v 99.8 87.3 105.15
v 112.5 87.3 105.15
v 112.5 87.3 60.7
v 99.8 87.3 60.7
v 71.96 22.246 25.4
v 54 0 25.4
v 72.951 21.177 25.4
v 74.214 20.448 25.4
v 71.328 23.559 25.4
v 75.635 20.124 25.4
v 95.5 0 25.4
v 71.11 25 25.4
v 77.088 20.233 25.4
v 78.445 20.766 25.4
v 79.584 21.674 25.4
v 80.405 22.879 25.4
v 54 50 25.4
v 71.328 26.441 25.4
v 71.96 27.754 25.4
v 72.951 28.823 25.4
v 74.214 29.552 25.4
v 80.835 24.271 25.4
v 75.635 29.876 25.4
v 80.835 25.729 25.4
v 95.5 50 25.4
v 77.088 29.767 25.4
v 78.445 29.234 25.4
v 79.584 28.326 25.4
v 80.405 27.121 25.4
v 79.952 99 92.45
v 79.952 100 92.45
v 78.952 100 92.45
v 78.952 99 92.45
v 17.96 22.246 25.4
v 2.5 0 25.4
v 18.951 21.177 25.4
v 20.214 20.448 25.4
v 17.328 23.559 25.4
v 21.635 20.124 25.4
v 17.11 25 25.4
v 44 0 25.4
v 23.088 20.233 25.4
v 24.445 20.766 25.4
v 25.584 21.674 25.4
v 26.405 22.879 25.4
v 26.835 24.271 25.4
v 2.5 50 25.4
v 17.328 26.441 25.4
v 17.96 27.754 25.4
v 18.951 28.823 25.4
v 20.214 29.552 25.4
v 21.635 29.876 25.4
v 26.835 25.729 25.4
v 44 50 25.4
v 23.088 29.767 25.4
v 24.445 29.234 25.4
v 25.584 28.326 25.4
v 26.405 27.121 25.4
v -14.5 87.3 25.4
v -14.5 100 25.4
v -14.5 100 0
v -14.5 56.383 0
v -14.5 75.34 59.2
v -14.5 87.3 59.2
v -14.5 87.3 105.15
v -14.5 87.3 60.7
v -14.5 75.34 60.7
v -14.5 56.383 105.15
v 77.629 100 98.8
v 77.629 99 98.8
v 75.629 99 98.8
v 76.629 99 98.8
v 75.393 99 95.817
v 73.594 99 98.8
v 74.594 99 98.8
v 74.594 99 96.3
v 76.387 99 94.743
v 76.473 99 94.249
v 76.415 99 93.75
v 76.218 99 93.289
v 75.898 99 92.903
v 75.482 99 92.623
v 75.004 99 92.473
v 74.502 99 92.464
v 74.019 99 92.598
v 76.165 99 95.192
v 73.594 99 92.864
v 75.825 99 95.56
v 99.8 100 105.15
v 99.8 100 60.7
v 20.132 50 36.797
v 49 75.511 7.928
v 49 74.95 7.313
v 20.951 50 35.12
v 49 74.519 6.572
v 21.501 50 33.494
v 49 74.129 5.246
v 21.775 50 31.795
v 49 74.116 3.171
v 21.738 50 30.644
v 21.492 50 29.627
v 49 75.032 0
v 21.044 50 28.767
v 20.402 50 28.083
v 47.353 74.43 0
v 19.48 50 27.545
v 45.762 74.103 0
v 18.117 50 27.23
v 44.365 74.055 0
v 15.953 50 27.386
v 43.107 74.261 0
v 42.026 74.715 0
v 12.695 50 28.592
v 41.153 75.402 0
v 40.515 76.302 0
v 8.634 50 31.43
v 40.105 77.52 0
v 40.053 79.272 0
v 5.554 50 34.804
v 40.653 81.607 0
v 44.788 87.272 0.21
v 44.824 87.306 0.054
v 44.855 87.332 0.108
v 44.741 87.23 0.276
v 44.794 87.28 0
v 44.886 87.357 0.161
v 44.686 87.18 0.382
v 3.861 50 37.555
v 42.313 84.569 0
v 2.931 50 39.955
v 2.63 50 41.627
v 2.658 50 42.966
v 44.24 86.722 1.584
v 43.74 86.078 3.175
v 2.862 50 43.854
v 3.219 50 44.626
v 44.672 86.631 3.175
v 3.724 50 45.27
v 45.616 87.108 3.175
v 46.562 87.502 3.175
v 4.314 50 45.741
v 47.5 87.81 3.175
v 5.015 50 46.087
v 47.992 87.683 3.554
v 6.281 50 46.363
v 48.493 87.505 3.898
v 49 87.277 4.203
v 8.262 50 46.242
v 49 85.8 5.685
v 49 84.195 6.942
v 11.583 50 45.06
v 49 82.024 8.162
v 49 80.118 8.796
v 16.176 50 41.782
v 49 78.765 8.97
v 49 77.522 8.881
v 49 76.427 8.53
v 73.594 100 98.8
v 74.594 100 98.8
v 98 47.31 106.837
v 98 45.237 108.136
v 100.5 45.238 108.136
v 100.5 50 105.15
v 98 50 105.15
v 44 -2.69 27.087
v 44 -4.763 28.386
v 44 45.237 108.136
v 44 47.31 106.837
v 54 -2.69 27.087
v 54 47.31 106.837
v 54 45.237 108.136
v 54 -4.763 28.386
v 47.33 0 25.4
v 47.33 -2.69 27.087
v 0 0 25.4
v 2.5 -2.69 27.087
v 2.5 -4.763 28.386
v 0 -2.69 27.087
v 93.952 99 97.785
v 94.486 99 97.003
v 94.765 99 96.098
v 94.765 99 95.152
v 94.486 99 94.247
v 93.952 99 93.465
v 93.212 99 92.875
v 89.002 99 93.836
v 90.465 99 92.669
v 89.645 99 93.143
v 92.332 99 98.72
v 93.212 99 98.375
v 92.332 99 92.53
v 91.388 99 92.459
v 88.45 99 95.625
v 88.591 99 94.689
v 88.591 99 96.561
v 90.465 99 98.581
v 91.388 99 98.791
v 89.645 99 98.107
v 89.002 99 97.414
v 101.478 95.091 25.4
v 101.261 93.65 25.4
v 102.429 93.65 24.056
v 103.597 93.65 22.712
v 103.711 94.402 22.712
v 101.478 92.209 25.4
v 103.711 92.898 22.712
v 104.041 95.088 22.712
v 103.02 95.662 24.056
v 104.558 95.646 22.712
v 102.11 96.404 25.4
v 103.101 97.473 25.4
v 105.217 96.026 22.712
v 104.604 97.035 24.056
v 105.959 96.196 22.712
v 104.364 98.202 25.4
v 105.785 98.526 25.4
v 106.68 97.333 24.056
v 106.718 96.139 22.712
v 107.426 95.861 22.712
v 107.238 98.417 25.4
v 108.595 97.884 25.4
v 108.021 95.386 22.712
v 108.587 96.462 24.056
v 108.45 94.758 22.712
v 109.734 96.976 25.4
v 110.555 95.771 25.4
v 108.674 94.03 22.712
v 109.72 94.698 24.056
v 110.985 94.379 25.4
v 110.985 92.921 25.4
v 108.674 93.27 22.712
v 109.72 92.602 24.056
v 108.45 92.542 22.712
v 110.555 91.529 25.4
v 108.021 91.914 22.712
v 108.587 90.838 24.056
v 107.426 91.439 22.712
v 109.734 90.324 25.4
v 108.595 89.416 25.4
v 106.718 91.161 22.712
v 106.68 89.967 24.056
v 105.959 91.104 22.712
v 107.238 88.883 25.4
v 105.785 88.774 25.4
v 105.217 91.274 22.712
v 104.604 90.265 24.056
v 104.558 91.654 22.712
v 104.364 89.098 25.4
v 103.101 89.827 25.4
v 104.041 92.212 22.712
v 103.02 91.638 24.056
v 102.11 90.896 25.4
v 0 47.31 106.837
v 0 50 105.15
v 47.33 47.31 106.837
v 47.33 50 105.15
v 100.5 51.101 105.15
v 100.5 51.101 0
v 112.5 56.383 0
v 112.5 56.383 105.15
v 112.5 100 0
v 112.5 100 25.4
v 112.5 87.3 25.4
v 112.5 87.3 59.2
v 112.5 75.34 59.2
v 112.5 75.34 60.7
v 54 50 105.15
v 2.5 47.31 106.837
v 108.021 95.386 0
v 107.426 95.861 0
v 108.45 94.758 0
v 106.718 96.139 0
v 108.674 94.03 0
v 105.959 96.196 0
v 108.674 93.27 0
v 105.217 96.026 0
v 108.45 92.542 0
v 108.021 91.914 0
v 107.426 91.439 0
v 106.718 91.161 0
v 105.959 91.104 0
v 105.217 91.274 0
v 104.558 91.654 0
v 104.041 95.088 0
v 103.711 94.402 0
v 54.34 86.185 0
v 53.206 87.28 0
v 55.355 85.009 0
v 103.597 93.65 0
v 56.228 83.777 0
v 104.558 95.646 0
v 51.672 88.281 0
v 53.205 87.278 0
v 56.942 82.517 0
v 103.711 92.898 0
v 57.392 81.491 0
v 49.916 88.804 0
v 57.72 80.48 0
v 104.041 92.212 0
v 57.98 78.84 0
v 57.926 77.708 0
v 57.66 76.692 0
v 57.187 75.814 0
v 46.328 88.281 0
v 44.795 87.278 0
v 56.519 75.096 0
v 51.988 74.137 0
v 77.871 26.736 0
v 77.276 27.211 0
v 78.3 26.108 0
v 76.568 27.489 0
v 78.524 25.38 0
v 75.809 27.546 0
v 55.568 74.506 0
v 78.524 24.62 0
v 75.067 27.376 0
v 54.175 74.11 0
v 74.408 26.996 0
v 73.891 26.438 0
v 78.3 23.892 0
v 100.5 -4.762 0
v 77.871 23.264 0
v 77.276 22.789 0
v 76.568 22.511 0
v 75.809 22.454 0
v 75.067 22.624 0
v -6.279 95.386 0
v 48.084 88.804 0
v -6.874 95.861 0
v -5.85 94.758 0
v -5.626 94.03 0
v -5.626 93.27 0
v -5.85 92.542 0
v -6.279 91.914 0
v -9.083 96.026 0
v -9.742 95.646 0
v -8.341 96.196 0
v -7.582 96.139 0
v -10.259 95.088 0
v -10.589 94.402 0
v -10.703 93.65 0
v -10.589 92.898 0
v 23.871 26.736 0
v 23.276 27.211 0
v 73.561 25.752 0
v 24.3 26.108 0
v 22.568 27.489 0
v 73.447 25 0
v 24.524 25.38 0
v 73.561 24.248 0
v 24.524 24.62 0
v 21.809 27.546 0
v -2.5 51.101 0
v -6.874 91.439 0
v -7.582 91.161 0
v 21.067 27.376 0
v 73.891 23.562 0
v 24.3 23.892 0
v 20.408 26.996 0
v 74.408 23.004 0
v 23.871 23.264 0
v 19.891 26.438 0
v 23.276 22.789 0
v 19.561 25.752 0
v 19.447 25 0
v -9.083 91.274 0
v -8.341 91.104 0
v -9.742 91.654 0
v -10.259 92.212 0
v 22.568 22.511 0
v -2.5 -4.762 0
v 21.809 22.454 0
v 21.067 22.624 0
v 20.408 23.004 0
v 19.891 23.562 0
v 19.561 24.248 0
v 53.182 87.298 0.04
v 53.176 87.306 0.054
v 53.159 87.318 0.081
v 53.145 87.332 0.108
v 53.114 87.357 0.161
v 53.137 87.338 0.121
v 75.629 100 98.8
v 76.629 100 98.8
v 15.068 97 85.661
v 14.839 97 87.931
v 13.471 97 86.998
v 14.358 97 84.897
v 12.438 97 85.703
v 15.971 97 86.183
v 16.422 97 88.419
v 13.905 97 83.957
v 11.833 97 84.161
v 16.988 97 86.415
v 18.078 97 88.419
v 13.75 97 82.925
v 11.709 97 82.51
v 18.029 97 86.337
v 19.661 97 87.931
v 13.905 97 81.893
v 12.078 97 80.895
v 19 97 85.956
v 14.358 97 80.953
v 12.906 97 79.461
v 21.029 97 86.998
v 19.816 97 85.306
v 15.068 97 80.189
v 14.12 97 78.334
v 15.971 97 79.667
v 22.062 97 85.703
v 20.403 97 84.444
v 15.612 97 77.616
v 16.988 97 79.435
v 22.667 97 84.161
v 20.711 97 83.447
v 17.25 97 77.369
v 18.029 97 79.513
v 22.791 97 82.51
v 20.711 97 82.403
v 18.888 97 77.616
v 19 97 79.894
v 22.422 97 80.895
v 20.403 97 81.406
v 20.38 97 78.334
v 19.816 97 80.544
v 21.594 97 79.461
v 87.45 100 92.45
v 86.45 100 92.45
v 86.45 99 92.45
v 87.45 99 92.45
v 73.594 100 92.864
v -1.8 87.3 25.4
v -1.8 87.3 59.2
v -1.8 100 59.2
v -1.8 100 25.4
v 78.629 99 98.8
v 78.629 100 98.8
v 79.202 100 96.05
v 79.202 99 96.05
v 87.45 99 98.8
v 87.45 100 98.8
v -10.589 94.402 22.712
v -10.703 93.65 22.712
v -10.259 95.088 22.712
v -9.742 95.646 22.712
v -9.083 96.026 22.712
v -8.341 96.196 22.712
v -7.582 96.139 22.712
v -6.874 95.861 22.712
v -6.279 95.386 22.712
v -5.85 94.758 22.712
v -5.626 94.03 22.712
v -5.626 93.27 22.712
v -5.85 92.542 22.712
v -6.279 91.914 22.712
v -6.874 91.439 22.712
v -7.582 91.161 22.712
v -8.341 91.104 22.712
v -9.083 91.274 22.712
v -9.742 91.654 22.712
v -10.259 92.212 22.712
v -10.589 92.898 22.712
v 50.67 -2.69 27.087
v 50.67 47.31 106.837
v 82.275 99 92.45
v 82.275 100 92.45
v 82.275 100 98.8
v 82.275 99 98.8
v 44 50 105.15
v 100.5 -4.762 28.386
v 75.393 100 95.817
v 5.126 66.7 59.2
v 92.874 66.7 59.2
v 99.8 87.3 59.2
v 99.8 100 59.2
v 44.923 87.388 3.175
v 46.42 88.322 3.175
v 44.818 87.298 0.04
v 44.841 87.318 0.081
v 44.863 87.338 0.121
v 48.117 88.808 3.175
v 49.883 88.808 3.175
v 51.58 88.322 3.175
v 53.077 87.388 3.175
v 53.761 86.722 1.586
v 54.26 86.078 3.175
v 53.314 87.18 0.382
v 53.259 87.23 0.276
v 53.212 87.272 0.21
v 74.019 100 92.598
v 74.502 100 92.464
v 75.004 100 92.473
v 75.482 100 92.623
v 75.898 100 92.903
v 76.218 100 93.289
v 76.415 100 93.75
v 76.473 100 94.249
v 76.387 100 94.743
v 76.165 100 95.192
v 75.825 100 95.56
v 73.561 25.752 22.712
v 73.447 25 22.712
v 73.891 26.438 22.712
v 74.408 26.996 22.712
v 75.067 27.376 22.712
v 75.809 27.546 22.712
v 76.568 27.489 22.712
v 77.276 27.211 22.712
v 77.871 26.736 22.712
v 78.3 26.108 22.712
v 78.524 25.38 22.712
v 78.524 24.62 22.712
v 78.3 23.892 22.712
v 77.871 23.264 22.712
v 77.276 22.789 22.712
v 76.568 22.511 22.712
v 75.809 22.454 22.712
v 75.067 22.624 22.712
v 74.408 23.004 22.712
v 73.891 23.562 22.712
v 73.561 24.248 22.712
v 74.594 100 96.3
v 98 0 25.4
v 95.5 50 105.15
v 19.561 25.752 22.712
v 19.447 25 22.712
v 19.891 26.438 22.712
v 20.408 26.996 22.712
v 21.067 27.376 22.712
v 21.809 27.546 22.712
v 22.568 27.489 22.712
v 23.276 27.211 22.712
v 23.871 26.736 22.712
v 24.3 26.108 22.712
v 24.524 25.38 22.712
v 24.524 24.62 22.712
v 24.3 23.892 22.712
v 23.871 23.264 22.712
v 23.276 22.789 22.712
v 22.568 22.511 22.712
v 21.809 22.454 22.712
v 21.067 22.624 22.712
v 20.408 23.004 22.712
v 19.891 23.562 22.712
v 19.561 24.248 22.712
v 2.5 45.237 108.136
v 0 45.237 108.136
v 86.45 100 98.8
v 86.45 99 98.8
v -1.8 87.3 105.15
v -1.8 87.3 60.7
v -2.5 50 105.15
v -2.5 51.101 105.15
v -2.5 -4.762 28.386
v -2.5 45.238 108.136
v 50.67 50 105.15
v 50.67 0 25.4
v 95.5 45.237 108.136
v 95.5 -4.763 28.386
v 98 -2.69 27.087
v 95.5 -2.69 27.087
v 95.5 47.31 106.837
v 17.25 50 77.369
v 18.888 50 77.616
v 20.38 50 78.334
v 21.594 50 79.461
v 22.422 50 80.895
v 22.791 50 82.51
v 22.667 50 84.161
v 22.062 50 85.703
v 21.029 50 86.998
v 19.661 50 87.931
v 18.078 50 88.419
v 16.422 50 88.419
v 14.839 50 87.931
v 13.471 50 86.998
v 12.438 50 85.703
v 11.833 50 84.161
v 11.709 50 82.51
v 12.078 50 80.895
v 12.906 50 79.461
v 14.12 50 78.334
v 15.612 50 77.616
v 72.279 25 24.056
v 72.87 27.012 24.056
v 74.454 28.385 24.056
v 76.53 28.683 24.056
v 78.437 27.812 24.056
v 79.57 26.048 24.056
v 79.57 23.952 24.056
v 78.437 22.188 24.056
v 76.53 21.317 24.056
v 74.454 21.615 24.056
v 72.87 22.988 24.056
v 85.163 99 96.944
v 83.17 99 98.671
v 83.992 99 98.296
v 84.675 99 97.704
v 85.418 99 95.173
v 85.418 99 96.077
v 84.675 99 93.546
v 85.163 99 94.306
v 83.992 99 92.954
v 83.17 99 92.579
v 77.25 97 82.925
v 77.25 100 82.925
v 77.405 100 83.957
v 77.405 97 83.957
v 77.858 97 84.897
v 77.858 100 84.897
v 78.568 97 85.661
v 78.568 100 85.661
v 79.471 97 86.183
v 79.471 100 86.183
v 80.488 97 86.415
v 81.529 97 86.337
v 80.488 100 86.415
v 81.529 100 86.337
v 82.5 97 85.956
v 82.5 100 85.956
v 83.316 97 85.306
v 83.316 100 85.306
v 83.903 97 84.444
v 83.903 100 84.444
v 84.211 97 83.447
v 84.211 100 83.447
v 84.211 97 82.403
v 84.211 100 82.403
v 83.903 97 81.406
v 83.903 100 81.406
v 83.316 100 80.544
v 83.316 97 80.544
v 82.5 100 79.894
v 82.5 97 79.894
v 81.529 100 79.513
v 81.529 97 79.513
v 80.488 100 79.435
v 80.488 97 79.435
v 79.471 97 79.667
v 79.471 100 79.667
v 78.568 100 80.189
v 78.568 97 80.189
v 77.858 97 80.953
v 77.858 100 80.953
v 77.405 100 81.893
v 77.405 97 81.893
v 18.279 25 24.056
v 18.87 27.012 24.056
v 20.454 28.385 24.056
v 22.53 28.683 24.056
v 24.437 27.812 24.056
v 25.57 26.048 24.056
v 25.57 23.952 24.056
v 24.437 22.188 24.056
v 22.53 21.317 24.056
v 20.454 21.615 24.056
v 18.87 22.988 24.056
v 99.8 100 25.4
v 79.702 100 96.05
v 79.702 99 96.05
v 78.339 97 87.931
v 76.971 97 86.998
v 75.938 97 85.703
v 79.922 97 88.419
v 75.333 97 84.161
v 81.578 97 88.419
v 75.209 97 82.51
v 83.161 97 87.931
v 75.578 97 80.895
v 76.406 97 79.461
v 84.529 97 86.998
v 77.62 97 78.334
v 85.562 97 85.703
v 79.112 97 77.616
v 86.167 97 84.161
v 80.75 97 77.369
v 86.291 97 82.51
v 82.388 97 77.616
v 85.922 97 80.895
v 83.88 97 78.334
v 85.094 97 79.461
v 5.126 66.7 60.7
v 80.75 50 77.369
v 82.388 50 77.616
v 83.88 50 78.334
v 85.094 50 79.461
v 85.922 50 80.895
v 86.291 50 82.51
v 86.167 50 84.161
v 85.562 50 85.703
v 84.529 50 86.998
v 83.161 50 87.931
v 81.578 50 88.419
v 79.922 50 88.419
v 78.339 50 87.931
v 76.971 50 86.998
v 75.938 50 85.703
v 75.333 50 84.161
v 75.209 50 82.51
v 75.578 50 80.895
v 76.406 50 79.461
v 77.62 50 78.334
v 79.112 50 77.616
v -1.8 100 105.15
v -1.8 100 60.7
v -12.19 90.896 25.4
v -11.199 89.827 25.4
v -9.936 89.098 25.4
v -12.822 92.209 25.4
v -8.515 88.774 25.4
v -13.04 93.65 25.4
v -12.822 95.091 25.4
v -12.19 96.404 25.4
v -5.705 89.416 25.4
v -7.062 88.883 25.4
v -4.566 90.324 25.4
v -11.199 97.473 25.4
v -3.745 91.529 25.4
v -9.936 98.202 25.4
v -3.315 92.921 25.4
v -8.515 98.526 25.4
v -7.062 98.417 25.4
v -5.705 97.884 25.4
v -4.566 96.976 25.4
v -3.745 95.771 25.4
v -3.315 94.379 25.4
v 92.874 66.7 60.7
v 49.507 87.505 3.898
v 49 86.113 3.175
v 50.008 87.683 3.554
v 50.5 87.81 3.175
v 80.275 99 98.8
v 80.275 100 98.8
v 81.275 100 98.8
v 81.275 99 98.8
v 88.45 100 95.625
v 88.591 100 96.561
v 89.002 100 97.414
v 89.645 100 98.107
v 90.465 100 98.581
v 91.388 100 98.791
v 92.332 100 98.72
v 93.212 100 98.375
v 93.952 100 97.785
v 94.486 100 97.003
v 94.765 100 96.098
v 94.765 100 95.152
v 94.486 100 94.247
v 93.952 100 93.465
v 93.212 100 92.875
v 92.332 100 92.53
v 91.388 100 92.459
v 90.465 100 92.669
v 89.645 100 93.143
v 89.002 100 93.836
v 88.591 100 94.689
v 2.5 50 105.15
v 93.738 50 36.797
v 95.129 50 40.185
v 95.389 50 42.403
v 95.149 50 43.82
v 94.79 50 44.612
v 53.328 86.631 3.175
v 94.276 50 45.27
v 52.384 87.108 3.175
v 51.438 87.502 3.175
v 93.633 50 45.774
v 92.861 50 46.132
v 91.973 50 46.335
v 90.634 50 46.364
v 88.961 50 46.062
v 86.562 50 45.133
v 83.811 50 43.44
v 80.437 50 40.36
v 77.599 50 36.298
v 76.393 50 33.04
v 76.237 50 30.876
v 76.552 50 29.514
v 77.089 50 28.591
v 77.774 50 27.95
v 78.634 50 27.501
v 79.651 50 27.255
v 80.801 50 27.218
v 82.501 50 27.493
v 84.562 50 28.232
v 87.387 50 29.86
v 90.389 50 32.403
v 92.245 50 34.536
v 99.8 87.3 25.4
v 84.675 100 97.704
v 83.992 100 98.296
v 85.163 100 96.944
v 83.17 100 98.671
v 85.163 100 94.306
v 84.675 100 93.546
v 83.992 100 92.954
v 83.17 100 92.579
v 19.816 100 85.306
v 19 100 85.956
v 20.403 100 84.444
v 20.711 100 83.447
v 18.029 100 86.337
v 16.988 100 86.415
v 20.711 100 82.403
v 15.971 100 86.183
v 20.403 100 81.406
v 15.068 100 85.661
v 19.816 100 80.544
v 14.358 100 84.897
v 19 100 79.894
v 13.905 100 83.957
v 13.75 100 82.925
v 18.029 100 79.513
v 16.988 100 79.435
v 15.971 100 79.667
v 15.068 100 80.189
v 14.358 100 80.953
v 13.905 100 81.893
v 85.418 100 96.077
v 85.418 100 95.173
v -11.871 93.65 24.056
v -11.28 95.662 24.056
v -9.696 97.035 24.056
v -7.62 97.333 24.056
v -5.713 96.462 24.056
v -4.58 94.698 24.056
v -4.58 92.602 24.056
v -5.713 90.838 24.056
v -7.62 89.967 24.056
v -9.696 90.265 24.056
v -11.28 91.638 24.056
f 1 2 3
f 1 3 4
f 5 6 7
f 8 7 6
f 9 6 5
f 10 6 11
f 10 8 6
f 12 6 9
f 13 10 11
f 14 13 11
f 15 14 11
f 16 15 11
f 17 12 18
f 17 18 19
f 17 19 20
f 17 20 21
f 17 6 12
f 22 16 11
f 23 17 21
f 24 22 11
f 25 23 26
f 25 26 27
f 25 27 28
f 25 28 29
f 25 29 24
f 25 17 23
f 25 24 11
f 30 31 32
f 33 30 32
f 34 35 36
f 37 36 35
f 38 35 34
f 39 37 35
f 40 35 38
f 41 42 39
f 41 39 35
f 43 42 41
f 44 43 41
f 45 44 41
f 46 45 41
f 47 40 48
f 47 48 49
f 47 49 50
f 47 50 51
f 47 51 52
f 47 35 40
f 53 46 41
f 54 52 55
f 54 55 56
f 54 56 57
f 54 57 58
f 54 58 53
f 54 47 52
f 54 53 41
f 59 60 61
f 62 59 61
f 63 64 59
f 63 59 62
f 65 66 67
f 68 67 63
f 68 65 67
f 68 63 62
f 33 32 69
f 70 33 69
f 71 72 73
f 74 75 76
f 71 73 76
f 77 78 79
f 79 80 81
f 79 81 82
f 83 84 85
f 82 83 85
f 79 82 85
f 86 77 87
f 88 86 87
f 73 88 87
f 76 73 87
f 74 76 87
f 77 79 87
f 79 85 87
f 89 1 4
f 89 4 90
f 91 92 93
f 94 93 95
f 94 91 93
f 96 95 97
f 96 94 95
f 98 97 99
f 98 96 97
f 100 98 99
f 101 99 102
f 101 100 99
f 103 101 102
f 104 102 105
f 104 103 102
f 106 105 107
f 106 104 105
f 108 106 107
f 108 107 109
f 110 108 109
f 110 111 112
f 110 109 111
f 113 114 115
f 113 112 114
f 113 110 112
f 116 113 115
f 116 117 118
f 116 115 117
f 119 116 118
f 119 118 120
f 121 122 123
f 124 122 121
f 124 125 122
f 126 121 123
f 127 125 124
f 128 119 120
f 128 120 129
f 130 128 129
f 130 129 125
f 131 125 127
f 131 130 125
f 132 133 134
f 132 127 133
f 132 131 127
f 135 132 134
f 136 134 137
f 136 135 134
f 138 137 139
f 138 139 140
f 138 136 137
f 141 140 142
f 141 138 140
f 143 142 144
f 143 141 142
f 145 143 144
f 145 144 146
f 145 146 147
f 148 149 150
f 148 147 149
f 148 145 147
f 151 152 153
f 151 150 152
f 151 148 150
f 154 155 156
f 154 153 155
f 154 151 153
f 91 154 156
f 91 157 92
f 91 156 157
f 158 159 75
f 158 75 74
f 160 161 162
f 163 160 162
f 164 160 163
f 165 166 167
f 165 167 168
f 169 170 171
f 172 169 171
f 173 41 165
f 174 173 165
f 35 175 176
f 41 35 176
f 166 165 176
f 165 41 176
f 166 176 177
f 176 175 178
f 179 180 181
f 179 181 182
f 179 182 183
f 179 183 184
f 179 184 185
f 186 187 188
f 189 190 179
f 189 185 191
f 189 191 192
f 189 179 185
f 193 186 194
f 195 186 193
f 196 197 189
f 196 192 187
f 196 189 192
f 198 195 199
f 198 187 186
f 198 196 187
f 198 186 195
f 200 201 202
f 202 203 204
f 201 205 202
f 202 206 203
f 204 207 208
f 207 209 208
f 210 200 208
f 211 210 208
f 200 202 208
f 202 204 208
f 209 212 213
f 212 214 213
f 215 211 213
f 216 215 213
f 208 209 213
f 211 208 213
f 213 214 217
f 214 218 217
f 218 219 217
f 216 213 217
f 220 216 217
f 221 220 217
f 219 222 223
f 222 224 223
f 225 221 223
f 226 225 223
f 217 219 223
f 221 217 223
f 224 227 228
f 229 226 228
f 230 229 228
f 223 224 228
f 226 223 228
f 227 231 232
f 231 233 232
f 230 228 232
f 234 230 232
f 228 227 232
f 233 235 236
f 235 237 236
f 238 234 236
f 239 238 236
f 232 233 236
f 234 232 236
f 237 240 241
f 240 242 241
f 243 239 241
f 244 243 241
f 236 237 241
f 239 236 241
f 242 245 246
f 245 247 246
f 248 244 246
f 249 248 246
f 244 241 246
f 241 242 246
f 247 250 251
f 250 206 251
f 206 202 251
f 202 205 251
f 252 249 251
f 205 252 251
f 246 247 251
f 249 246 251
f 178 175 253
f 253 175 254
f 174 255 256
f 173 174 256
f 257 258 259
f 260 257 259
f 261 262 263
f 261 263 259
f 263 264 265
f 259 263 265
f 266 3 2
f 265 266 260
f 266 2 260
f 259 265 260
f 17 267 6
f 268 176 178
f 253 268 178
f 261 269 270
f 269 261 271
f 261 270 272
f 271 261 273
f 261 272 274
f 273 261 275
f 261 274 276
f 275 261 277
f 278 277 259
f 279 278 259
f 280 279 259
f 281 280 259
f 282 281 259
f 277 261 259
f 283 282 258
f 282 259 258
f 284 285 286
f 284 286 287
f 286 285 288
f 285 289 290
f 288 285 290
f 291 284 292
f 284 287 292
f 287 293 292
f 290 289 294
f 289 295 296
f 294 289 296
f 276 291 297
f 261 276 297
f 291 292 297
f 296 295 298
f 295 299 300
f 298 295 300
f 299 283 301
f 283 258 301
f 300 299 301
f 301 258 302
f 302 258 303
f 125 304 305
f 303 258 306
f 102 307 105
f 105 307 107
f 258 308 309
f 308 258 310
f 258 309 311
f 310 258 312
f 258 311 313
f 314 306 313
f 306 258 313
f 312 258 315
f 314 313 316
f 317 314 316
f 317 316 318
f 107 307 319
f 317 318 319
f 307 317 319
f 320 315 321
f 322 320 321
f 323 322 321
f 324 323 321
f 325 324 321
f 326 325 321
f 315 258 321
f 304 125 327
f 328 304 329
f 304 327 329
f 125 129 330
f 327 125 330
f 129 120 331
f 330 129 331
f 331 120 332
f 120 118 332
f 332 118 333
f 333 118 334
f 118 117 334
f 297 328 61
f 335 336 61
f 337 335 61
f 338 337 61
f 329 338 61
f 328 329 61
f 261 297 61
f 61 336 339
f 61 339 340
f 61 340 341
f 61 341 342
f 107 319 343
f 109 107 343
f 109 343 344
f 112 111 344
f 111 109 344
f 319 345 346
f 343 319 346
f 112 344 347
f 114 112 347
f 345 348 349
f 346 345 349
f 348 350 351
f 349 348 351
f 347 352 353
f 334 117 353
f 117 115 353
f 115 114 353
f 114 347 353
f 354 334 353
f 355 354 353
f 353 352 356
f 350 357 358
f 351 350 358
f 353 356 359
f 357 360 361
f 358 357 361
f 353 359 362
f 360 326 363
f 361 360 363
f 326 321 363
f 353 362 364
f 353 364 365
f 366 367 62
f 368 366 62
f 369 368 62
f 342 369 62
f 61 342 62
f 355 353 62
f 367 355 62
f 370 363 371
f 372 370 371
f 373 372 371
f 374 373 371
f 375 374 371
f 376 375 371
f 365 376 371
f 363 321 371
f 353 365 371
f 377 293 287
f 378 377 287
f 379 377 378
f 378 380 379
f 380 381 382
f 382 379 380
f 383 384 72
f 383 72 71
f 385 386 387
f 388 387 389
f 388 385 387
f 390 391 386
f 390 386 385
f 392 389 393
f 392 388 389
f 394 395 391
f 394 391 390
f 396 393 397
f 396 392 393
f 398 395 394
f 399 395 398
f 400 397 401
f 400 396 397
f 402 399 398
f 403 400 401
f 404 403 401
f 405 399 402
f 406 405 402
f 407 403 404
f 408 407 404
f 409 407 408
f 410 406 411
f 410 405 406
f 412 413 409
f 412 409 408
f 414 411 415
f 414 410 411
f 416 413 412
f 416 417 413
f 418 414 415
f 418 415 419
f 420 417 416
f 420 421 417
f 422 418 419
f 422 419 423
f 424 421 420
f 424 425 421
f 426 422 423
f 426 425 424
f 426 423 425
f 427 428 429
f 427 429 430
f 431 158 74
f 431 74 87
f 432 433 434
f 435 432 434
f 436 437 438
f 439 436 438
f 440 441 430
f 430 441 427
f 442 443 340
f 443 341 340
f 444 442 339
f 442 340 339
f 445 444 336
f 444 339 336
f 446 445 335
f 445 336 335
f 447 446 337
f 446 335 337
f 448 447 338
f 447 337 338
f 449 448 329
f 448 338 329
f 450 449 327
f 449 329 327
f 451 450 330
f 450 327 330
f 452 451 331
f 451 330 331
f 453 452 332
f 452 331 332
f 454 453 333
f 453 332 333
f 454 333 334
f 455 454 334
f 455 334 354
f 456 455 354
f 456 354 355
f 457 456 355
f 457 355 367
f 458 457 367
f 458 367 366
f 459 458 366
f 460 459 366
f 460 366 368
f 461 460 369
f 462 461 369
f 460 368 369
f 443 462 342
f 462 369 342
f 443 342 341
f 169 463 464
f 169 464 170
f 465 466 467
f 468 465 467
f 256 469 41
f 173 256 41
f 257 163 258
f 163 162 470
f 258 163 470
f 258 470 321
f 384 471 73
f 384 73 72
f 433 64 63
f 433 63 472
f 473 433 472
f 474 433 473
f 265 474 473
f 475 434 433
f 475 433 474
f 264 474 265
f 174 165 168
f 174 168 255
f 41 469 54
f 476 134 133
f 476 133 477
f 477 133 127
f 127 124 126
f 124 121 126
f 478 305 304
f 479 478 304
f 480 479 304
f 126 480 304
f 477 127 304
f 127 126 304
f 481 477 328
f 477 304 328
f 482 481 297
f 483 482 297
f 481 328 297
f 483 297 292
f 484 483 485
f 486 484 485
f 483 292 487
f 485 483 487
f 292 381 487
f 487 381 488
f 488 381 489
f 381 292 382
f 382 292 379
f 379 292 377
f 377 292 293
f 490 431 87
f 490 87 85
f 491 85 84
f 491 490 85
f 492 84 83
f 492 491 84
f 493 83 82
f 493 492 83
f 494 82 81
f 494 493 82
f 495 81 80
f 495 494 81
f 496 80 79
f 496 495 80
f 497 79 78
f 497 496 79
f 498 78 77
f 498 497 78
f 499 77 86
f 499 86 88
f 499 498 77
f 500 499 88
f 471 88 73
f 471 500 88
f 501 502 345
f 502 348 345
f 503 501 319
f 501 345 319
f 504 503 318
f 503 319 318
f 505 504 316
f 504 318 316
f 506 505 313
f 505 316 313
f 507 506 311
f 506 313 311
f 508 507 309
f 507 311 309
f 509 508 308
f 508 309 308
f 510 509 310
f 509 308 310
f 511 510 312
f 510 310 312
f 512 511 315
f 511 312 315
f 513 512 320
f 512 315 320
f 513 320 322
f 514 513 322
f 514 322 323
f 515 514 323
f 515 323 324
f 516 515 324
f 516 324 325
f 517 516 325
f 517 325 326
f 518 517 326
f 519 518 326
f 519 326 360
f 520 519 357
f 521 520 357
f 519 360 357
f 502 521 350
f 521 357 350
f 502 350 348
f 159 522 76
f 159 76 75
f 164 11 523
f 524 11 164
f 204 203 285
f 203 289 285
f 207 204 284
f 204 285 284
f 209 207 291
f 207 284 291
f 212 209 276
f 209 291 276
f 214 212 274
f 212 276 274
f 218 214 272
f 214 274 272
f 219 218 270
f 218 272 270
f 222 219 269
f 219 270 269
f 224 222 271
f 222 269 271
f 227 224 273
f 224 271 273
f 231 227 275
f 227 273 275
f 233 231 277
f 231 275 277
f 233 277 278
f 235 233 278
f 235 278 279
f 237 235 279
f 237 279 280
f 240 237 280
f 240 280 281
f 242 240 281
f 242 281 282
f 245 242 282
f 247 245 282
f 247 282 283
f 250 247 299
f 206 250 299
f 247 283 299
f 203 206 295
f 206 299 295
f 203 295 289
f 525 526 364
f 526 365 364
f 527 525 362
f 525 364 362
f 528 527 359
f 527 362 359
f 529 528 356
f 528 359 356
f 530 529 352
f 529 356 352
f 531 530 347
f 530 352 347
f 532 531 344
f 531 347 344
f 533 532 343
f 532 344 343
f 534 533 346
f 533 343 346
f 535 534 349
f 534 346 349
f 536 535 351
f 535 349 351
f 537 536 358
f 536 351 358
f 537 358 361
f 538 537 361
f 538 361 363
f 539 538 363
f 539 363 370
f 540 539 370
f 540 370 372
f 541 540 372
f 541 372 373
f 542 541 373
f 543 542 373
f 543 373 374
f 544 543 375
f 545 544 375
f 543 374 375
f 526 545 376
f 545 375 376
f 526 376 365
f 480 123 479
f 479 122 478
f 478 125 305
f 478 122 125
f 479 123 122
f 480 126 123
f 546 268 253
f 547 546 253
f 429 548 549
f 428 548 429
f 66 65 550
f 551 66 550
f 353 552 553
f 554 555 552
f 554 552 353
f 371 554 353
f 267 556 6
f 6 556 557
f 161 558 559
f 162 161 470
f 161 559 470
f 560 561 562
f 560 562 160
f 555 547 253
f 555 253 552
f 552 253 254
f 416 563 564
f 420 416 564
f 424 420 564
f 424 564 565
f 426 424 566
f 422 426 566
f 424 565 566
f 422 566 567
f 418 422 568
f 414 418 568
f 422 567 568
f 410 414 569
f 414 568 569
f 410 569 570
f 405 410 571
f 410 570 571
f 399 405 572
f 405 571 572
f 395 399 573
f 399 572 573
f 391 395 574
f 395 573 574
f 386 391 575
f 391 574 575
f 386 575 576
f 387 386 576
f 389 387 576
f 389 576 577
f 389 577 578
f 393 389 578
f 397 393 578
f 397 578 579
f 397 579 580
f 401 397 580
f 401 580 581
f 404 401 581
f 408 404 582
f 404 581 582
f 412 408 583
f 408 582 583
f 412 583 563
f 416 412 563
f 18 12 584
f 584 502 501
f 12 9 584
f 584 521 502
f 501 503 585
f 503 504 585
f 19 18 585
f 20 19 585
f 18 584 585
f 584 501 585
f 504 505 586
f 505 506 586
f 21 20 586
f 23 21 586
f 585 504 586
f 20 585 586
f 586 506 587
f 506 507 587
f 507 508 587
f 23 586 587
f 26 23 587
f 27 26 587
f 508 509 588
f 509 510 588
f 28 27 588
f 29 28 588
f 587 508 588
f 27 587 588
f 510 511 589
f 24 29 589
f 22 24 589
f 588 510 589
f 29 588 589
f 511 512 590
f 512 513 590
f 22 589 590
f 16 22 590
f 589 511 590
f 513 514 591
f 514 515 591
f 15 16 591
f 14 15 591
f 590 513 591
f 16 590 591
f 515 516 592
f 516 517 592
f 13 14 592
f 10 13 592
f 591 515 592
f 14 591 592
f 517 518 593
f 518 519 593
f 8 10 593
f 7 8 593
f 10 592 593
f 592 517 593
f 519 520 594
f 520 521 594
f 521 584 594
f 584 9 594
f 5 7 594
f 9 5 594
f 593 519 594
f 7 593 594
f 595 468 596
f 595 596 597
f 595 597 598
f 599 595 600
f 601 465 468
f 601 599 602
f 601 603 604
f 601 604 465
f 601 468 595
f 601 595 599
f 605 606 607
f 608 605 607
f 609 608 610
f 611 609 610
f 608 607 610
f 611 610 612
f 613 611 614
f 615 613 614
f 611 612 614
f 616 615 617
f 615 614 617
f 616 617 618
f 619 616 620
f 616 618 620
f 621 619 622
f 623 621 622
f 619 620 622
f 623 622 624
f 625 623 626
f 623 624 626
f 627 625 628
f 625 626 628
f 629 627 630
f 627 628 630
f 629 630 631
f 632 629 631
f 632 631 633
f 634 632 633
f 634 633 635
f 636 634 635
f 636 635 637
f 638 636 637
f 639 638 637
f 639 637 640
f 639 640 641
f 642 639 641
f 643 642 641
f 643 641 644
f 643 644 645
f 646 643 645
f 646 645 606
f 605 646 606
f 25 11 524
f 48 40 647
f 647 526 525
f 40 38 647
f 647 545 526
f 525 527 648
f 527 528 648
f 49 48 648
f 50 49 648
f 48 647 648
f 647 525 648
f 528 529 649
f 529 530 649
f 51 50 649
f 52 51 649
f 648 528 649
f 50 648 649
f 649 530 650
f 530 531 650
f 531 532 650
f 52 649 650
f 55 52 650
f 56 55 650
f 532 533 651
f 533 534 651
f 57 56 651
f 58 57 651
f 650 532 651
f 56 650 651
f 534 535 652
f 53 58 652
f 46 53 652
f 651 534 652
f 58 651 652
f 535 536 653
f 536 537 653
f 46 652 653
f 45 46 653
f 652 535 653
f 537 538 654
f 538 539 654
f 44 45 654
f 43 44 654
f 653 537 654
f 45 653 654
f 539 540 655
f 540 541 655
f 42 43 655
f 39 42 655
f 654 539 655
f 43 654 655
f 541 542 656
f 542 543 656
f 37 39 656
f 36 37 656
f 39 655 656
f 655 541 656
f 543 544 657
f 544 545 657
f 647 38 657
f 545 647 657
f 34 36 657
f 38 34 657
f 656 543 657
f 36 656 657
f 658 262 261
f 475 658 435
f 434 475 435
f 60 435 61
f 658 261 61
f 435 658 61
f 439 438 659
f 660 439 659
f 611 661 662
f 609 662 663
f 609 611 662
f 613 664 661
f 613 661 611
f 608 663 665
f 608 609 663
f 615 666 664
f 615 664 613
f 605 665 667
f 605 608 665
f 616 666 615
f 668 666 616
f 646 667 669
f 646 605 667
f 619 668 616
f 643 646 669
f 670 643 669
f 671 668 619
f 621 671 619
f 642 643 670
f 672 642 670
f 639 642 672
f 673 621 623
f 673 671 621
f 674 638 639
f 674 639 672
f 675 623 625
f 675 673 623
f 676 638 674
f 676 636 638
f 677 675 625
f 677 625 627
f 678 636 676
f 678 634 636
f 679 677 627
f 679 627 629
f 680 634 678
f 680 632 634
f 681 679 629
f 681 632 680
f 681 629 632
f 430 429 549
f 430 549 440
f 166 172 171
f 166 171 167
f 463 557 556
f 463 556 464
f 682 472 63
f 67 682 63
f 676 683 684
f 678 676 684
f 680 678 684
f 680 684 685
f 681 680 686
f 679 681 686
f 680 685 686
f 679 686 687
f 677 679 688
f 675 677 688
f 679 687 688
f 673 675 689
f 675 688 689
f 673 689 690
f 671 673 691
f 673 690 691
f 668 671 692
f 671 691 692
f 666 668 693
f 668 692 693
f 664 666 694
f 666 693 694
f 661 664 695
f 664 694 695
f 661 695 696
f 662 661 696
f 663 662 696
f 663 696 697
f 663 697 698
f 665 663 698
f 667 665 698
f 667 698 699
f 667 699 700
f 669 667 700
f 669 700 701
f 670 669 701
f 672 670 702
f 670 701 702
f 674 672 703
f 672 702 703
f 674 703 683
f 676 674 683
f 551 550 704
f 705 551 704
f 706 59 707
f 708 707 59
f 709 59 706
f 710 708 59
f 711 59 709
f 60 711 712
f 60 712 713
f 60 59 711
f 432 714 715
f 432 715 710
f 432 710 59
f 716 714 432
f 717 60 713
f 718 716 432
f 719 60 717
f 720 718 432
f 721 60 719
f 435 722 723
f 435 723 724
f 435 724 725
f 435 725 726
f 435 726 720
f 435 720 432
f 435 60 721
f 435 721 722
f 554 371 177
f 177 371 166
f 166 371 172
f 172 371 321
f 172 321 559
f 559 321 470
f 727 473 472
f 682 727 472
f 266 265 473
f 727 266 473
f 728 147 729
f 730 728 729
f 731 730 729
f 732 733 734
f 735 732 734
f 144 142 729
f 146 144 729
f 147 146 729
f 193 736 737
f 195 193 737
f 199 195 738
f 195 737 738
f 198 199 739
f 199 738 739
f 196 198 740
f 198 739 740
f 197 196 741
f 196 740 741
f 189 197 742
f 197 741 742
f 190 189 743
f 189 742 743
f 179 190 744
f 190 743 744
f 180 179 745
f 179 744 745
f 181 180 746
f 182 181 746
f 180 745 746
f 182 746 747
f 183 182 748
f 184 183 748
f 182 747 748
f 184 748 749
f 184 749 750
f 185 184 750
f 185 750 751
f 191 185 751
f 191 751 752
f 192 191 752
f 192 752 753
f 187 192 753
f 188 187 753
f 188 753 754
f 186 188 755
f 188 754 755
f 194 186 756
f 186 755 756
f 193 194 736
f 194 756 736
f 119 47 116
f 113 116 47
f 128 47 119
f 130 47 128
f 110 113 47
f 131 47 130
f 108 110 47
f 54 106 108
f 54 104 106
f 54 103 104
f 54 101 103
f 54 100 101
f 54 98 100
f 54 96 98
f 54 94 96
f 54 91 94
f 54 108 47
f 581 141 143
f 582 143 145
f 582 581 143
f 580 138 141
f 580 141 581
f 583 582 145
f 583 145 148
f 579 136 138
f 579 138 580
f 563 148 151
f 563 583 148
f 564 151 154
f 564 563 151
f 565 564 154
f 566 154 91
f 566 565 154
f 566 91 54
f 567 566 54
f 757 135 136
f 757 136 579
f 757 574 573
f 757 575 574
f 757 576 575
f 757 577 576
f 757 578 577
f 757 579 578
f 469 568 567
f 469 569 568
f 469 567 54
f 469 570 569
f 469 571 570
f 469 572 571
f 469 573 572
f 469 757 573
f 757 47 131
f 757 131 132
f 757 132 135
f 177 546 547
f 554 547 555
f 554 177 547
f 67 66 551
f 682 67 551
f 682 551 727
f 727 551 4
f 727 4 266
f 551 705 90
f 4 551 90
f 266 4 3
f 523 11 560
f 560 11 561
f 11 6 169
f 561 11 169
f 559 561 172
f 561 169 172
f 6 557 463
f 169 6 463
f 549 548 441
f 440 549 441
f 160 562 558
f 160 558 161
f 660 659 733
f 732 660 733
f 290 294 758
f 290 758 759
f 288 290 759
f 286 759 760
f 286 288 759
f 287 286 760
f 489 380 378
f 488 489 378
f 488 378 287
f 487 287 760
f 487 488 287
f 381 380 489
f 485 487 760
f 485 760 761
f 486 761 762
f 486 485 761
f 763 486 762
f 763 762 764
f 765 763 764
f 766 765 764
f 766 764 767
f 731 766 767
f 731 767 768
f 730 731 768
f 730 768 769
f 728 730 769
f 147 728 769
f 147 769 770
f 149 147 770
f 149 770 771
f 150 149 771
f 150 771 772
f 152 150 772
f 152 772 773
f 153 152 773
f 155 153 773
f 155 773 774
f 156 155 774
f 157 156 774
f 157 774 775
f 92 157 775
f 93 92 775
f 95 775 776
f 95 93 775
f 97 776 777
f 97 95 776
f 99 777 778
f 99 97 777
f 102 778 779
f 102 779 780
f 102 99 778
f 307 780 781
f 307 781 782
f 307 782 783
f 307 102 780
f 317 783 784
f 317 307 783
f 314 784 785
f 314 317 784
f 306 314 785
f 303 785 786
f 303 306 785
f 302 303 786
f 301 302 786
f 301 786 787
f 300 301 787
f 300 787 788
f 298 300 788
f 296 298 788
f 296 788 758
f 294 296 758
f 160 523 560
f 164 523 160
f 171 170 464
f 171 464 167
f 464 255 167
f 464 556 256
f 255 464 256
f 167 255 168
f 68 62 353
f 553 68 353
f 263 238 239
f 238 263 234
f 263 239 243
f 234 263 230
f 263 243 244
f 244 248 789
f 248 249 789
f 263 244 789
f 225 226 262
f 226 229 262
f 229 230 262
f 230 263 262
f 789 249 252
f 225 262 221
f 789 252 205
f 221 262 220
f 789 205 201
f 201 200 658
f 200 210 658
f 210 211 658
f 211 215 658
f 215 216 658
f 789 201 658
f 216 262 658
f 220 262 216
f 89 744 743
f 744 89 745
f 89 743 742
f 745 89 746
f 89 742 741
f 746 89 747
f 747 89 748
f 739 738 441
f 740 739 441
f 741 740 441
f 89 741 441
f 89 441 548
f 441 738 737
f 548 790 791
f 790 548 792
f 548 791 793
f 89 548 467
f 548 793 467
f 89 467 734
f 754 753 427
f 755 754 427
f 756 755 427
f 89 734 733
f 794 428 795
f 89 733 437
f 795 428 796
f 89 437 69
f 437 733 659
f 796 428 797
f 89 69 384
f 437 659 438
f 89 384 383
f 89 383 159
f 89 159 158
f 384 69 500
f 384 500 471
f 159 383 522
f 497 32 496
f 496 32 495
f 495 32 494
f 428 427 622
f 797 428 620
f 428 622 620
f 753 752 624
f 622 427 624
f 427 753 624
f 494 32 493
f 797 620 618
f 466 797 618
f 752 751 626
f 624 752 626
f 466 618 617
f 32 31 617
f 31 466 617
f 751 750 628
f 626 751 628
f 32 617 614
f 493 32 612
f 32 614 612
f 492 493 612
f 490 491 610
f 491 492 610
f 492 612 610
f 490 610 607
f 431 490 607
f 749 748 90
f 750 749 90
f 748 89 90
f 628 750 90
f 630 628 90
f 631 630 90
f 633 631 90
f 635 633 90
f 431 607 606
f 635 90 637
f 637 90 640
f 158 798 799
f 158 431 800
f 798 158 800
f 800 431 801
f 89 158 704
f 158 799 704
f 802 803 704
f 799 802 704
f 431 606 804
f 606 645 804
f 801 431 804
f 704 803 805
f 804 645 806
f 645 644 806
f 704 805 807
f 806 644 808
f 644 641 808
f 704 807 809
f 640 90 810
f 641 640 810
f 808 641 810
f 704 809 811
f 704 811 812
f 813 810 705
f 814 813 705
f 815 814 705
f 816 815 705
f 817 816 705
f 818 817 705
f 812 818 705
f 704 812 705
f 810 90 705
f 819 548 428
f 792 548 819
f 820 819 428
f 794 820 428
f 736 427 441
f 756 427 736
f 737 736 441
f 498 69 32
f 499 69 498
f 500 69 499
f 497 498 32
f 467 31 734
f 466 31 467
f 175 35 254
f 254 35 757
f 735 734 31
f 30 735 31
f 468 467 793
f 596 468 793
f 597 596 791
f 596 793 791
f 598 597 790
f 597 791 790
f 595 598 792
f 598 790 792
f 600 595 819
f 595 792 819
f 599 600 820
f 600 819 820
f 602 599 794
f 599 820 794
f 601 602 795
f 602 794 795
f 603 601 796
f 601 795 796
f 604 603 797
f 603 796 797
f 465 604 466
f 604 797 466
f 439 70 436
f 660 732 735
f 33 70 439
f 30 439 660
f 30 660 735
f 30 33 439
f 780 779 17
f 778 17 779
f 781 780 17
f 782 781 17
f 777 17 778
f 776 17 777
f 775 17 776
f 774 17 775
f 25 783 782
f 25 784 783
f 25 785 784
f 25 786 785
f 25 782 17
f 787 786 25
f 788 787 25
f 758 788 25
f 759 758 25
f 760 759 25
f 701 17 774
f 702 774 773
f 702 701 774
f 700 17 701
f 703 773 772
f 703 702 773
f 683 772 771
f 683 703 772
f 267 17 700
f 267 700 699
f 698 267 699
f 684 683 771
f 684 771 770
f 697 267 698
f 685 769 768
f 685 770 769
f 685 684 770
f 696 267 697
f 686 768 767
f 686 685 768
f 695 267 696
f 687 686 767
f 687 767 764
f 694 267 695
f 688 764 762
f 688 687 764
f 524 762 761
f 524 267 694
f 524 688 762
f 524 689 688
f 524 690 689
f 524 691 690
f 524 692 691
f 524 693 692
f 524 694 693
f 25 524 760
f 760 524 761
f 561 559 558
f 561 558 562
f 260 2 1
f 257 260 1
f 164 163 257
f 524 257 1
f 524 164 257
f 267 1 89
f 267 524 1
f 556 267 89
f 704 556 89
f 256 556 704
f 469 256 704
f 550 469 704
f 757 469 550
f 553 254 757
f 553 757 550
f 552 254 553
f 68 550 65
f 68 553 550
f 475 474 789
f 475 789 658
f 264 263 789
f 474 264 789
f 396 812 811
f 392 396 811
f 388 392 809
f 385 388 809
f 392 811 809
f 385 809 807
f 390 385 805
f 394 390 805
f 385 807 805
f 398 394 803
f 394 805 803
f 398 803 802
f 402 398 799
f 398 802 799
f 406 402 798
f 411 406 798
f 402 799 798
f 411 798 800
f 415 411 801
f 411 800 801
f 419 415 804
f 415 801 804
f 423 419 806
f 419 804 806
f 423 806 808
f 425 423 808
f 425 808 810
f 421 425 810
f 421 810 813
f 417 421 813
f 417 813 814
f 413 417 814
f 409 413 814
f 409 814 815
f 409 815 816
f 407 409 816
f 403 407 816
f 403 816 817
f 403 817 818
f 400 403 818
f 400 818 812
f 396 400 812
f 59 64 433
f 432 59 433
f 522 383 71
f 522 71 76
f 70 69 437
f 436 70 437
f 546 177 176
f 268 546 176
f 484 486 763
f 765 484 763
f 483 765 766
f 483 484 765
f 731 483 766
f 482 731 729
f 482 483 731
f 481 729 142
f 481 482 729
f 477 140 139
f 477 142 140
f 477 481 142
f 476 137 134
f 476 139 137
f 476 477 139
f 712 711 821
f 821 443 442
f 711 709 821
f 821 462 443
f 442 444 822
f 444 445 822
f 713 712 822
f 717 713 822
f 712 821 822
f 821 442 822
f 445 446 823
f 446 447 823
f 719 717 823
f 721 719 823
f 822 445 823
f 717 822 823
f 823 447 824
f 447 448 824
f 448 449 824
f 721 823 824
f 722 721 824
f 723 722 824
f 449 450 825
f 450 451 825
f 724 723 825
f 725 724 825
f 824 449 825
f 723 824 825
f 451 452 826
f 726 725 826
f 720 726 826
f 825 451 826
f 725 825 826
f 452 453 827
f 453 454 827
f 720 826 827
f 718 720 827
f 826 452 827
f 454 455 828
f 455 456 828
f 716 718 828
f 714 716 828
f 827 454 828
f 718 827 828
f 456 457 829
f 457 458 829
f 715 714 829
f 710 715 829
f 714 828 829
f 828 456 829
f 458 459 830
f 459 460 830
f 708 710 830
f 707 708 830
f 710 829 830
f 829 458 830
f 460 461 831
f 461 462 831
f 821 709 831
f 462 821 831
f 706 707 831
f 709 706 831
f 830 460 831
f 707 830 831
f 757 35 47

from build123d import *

# Parameters (mm, degrees)
BOSS_EXTRU_1_DEPTH                                = 59.2
BOSS_EXTRU_2_DEPTH                                = 1.5
BOSS_EXTRU_3_DEPTH                                = 44.45
ESQUISSE5_W                                       = 98
ESQUISSE5_H                                       = 50
ENL_V_MAT_EXTRU_1_DEPTH                           = 79.75
NERVURE3_REACH                                    = 219.919
ESQUISSE7_WALL_W                                  = 531.966109146
ESQUISSE7_WALL_H                                  = 10
ESQUISSE8_W                                       = 12.7
ESQUISSE8_H                                       = 12.7
ENL_V_MAT_EXTRU_2_DEPTH                           = 79.75
FRAISAGE_POUR_VIS_T_TE_FRAIS_E_BOMB_E_D           = 5.1054
FRAISAGE_POUR_VIS_T_TE_FRAIS_E_BOMB_E_CSINK_D     = 9.779
FRAISAGE_POUR_VIS_T_TE_FRAIS_E_BOMB_E_CSINK_ANGLE = 82
ENL_VEMENT_START                                  = 1.582341914
ENL_VEMENT_DE_MATI_RE_BALAYAGE2_OUTLINE_R         = 6.35
ENL_VEMENT_DE_MATI_RE_BALAYAGE2_DEPTH             = 71.529963189
ENL_VEMENT_START_2                                = -14.345570266
ENL_VEMENT_DE_MATI_RE_BALAYAGE3_OUTLINE_R         = 6.35
ENL_VEMENT_DE_MATI_RE_BALAYAGE3_DEPTH             = 71.529963189
ESQUISSE26_R                                      = 6.35
ENL_V_MAT_EXTRU_4_DEPTH                           = 3.175
NERVURE4_REACH                                    = 258.559
ESQUISSE27_WALL_W                                 = 609.246066174
ESQUISSE27_WALL_H                                 = 2.5
ESQUISSE29_R                                      = 3.5
ENL_V_MAT_EXTRU_7_DEPTH                           = 257.559080586
ESQUISSE28_R                                      = 5.55625
ENL_V_MAT_EXTRU_6_DEPTH                           = 47
ESQUISSE30_R                                      = 3.175
LETTRE_O_DEPTH                                    = 1
ESQUISSE31_W                                      = 1
ESQUISSE31_H                                      = 6.35
LETTRE_I_DEPTH                                    = 1
LETTRE_D_DEPTH                                    = 1
LETTRE_A_DEPTH                                    = 1
LETTRE_R_DEPTH                                    = 1
BOSS_EXTRU_5_REACH                                = 258.559
BOSS_EXTRU_6_DEPTH                                = 94.127905
BOSS_EXTRU_7_DEPTH                                = 2.5
ESQUISSE38_W                                      = 2.5
ESQUISSE38_H                                      = 2.446117838
BOSS_EXTRU_8_DEPTH                                = 94.127905
ENL_V_MAT_EXTRU_13_REACH                          = 263.075
BOSS_EXTRU_9_REACH                                = 245.841
ESQUISSE40_W                                      = 2.5
ESQUISSE40_H                                      = 105.15
ENL_V_MAT_EXTRU_14_REACH                          = 258.559


# Read off the part's stored shape, not the designer's step: Enlèvement de matière-Balayage2, Enlèvement de matière-Balayage3
with BuildPart() as part:
    # Esquisse2 → Boss.-Extru.1 (new body)
    with BuildSketch(Plane.XY):
        Polygon((0, 0), (98, 0), (98, 50), (211.579865137, 100), (-113.579865137, 100), (0, 50), align=None)
    extrude(amount=BOSS_EXTRU_1_DEPTH)

    # Esquisse3 → Boss.-Extru.2 (add)
    with BuildSketch(Plane.XY.offset(59.2)):
        Polygon((0, 0), (98, 0), (98, 50), (211.579865137, 100), (168.51775825, 100), (92.873568069, 66.7), (5.126431931, 66.7), (-70.51775825, 100), (-113.579865137, 100), (0, 50), align=None)
    extrude(amount=BOSS_EXTRU_2_DEPTH)

    # Esquisse4 → Boss.-Extru.3 (add)
    with BuildSketch(Plane.XY.offset(60.7)):
        Polygon((0, 0), (98, 0), (98, 50), (211.579865137, 100), (-113.579865137, 100), (0, 50), align=None)
    extrude(amount=BOSS_EXTRU_3_DEPTH)

    # Esquisse5 → Enlèv. mat.-Extru.1 (cut)
    with BuildSketch(Plane.XY.offset(105.15)):
        with Locations((49, 25)):
            Rectangle(ESQUISSE5_W, ESQUISSE5_H)
    extrude(amount=-ENL_V_MAT_EXTRU_1_DEPTH, mode=Mode.SUBTRACT)

    # Esquisse7 wall → Nervure3 (add, up to next)
    with BuildSketch(Plane(origin=(49, 25, 65.275), x_dir=(0, -0.531192105031, -0.847251407525), z_dir=(0, 0.847251407525, -0.531192105031)), mode=Mode.PRIVATE) as nervure3_sk1:
        Rectangle(ESQUISSE7_WALL_W, ESQUISSE7_WALL_H)
    nervure3_tool1 = extrude(nervure3_sk1.sketch, amount=NERVURE3_REACH, mode=Mode.PRIVATE) - part.part
    add(nervure3_tool1.solids().sort_by_distance((49, 25, 65.275))[0])

    # Esquisse8 → Enlèv. mat.-Extru.2 (cut)
    with BuildSketch(Plane.XY.offset(105.15)):
        with Locations((-8.15, 93.65)):
            Rectangle(ESQUISSE8_W, ESQUISSE8_H)
    enl_v_mat_extru_2 = extrude(amount=-ENL_V_MAT_EXTRU_2_DEPTH, mode=Mode.SUBTRACT)

    # Symétrie1: Enlèv. mat.-Extru.2 across plane
    add(enl_v_mat_extru_2.mirror(Plane(origin=(49, 0, 0), x_dir=(0, 0, 1), z_dir=(1, 0, 0))), mode=Mode.SUBTRACT)

    # Fraisage pour vis à tête fraisée bombée #101 (through all)
    with Locations(Plane.XY.offset(25.4)):
        with Locations((22, 25), (76, 25), (106.15, 93.65), (-8.15, 93.65)):
            CounterSinkHole(FRAISAGE_POUR_VIS_T_TE_FRAIS_E_BOMB_E_D / 2, FRAISAGE_POUR_VIS_T_TE_FRAIS_E_BOMB_E_CSINK_D / 2, counter_sink_angle=FRAISAGE_POUR_VIS_T_TE_FRAIS_E_BOMB_E_CSINK_ANGLE)

    # Enlèvement de matière-Balayage2 outline → Enlèvement de matière-Balayage2 (cut)
    with BuildSketch(Plane(origin=(0, 0, 0), x_dir=(0.8002544678430299, -0.3970882953901229, 0.44934805258444765), z_dir=(0.5996605595645498, 0.5299192642332058, -0.5996605595645498)).offset(ENL_VEMENT_START)):
        with Locations((6.44062437, -61.833135415)):
            Circle(ENL_VEMENT_DE_MATI_RE_BALAYAGE2_OUTLINE_R)
    extrude(amount=ENL_VEMENT_DE_MATI_RE_BALAYAGE2_DEPTH, mode=Mode.SUBTRACT)

    # Enlèvement de matière-Balayage3 outline → Enlèvement de matière-Balayage3 (cut)
    with BuildSketch(Plane(origin=(0, 0, 0), x_dir=(0.8002544678430281, 0.39708829539012125, -0.4493480525844523), z_dir=(0.5996605595645522, -0.5299192642332002, 0.5996605595645522)).offset(ENL_VEMENT_START_2)):
        with Locations((71.984313478, 61.833135415)):
            Circle(ENL_VEMENT_DE_MATI_RE_BALAYAGE3_OUTLINE_R)
    extrude(amount=ENL_VEMENT_DE_MATI_RE_BALAYAGE3_DEPTH, mode=Mode.SUBTRACT)

    # Esquisse26 → Enlèv. mat.-Extru.4 (cut)
    with BuildSketch(Plane(origin=(0, 0, 0), x_dir=(-1, 0, 0), z_dir=(0, 0, -1))):
        with Locations((-49, 82.52)):
            Circle(ESQUISSE26_R)
    extrude(amount=-ENL_V_MAT_EXTRU_4_DEPTH, mode=Mode.SUBTRACT)

    # Esquisse27 wall → Nervure4 (add, up to next)
    with BuildSketch(Plane(origin=(0, 25, 65.275), x_dir=(0, 0.531192105031, 0.847251407525), z_dir=(0, 0.847251407525, -0.531192105031)), mode=Mode.PRIVATE) as nervure4_sk1:
        with Locations((0, 1.25)):
            Rectangle(ESQUISSE27_WALL_W, ESQUISSE27_WALL_H)
    nervure4_tool1 = extrude(nervure4_sk1.sketch, amount=NERVURE4_REACH, mode=Mode.PRIVATE) - part.part
    nervure4 = nervure4_tool1.solids().sort_by_distance((0, 25, 65.275))[0]
    add(nervure4)

    # Symétrie5: Nervure4 across plane
    add(nervure4.mirror(Plane.ZY.offset(-49)))

    # Esquisse29 → Enlèv. mat.-Extru.7 (cut, through all)
    with BuildSketch(Plane(origin=(0, 100, 0), x_dir=(1, 0, 0), z_dir=(0, 1, 0))):
        with Locations(Location((80.75, -82.925, 0), (0, 0, 180))):
            Circle(ESQUISSE29_R)
        with Locations(Location((17.25, -82.925, 0), (0, 0, 180))):
            Circle(ESQUISSE29_R)
    extrude(amount=-ENL_V_MAT_EXTRU_7_DEPTH, mode=Mode.SUBTRACT)

    # Esquisse28 → Enlèv. mat.-Extru.6 (cut)
    with BuildSketch(Plane.XZ.offset(-50)):
        with Locations(Location((17.25, 82.925, 0), (0, 0, 270))):
            Circle(ESQUISSE28_R)
        with Locations(Location((80.75, 82.925, 0), (0, 0, 270))):
            Circle(ESQUISSE28_R)
    extrude(amount=-ENL_V_MAT_EXTRU_6_DEPTH, mode=Mode.SUBTRACT)

    # Esquisse30 → Lettre_O (cut)
    with BuildSketch(Plane(origin=(0, 100, 0), x_dir=(1, 0, 0), z_dir=(0, 1, 0))):
        with Locations(Location((91.625, -95.625, 0), (0, 0, 180))):
            Circle(ESQUISSE30_R)
    extrude(amount=-LETTRE_O_DEPTH, mode=Mode.SUBTRACT)

    # Esquisse31 → Lettre_I (cut)
    with BuildSketch(Plane(origin=(0, 100, 0), x_dir=(1, 0, 0), z_dir=(0, 1, 0))):
        with Locations((86.95, -95.625)):
            Rectangle(ESQUISSE31_W, ESQUISSE31_H)
    extrude(amount=-LETTRE_I_DEPTH, mode=Mode.SUBTRACT)

    # Esquisse32 → Lettre_D (cut)
    with BuildSketch(Plane(origin=(0, 100, 0), x_dir=(1, 0, 0), z_dir=(0, 1, 0))):
        with BuildLine():
            Line((82.275, -92.45), (82.275, -98.8))
            ThreePointArc((82.275, -98.8), (85.45, -95.625), (82.275, -92.45))
        make_face()
    extrude(amount=-LETTRE_D_DEPTH, mode=Mode.SUBTRACT)

    # Esquisse33 → Lettre_A (cut)
    with BuildSketch(Plane(origin=(0, 100, 0), x_dir=(1, 0, 0), z_dir=(0, 1, 0))):
        Polygon((77.629166667, -98.8), (78.629166667, -98.8), (79.202083333, -96.05), (79.702083333, -96.05), (80.275, -98.8), (81.275, -98.8), (79.952083333, -92.45), (78.952083333, -92.45), align=None)
    extrude(amount=-LETTRE_A_DEPTH, mode=Mode.SUBTRACT)

    # Esquisse34 → Lettre_R (cut)
    with BuildSketch(Plane(origin=(0, 100, 0), x_dir=(1, 0, 0), z_dir=(0, 1, 0))):
        with BuildLine():
            Line((73.593632761, -98.8), (73.593632761, -92.863864698))
            ThreePointArc((73.593632761, -92.863864698), (76.218088657, -93.289201214), (75.393480286, -95.816789182))
            Line((75.393480286, -95.816789182), (76.629166667, -98.8))
            Line((76.629166667, -98.8), (75.629166667, -98.8))
            Line((75.629166667, -98.8), (74.593632761, -96.3))
            Line((74.593632761, -96.3), (74.593632761, -98.8))
            Line((74.593632761, -98.8), (73.593632761, -98.8))
        make_face()
    extrude(amount=-LETTRE_R_DEPTH, mode=Mode.SUBTRACT)

    # Boss.-Extru.5: up to this face of the body (flat: up to its plane)
    boss_extru_5_end = Plane(part.part.faces().sort_by_distance((98, 30.090642155, 36.697287119))[0])
    # Esquisse35 → Boss.-Extru.5 (add, up to the picked face)
    with BuildSketch(Plane.ZY, mode=Mode.PRIVATE) as boss_extru_5_sk1:
        Polygon((25.4, 0), (28.385893417, -4.7625), (0, -4.7625), (0, 0), align=None)
    boss_extru_5_tool1 = split(extrude(boss_extru_5_sk1.sketch, amount=-BOSS_EXTRU_5_REACH, mode=Mode.PRIVATE), bisect_by=boss_extru_5_end, keep=Keep.BOTH, mode=Mode.PRIVATE)
    add(boss_extru_5_tool1.solids().sort_by(Axis((0, -2.425315, 13.460287), (1, 0, 0)))[0])

    # Esquisse36 → Boss.-Extru.6 (add)
    with BuildSketch(Plane(origin=(0, 11.43135277, 18.233007668), x_dir=(1, 0, 0), z_dir=(0, 0.5311921050311518, 0.8472514075246933))):
        Polygon((50.67, -13.492279468), (50.67, -16.667279468), (54, -16.667279468), (54, -19.113397306), (44, -19.113397306), (44, -16.667279468), (47.33, -16.667279468), (47.33, -13.492279468), align=None)
    extrude(amount=BOSS_EXTRU_6_DEPTH)

    # Esquisse37 → Boss.-Extru.7 (add)
    with BuildSketch(Plane(origin=(98, 0, 0), x_dir=(0, 0, -1), z_dir=(1, 0, 0))):
        Polygon((0, 50), (0, -4.7625), (-28.385893417, -4.7625), (-115.732080917, 50), align=None)
    boss_extru_7 = extrude(amount=BOSS_EXTRU_7_DEPTH)

    # Esquisse38 → Boss.-Extru.8 (add)
    with BuildSketch(Plane(origin=(0, 11.43135277, 18.233007668), x_dir=(1, 0, 0), z_dir=(0, 0.5311921050311518, 0.8472514075246933))):
        with Locations((96.75, -17.890338387)):
            Rectangle(ESQUISSE38_W, ESQUISSE38_H)
    boss_extru_8 = extrude(amount=BOSS_EXTRU_8_DEPTH)

    # Esquisse39 → Enlèv. mat.-Extru.13 (cut, up to next)
    with BuildSketch(Plane.ZY.offset(-98), mode=Mode.PRIVATE) as enl_v_mat_extru_13_sk1:
        Polygon((108.135893417, 45.2375), (105.15, 50), (115.732080917, 50), align=None)
    enl_v_mat_extru_13_tool1 = extrude(enl_v_mat_extru_13_sk1.sketch, amount=-ENL_V_MAT_EXTRU_13_REACH, mode=Mode.PRIVATE) & part.part
    enl_v_mat_extru_13 = enl_v_mat_extru_13_tool1.solids().sort_by_distance((98, 48.4125, 109.672658))[0]
    add(enl_v_mat_extru_13, mode=Mode.SUBTRACT)

    # Esquisse40 → Boss.-Extru.9 (add, up to next)
    with BuildSketch(Plane(origin=(0, 50, 0), x_dir=(1, 0, 0), z_dir=(0, 1, 0)), mode=Mode.PRIVATE) as boss_extru_9_sk1:
        with Locations((99.25, -52.575)):
            Rectangle(ESQUISSE40_W, ESQUISSE40_H)
    boss_extru_9_tool1 = extrude(boss_extru_9_sk1.sketch, amount=BOSS_EXTRU_9_REACH, mode=Mode.PRIVATE) - part.part
    boss_extru_9 = boss_extru_9_tool1.solids().sort_by_distance((99.25, 50, 52.575))[0]
    add(boss_extru_9)

    # Symétrie6: Boss.-Extru.7, Boss.-Extru.8, Enlèv. mat.-Extru.13, Boss.-Extru.9 across plane
    add(boss_extru_7.mirror(Plane.ZY.offset(-49)))
    add(boss_extru_8.mirror(Plane.ZY.offset(-49)))
    add(enl_v_mat_extru_13.mirror(Plane.ZY.offset(-49)), mode=Mode.SUBTRACT)
    add(boss_extru_9.mirror(Plane.ZY.offset(-49)))

    # Esquisse41 → Enlèv. mat.-Extru.14 (cut, up to next)
    with BuildSketch(Plane.XY.offset(105.15), mode=Mode.PRIVATE) as enl_v_mat_extru_14_sk1:
        Polygon((112.5, 100), (112.5, 56.38317363), (211.579865137, 100), align=None)
    enl_v_mat_extru_14_tool1 = extrude(enl_v_mat_extru_14_sk1.sketch, amount=-ENL_V_MAT_EXTRU_14_REACH, mode=Mode.PRIVATE) & part.part
    # Esquisse41 → Enlèv. mat.-Extru.14 (cut, up to next)
    with BuildSketch(Plane.XY.offset(105.15), mode=Mode.PRIVATE) as enl_v_mat_extru_14_sk2:
        Polygon((-14.5, 100), (-14.5, 56.38317363), (-113.579865137, 100), align=None)
    enl_v_mat_extru_14_tool2 = extrude(enl_v_mat_extru_14_sk2.sketch, amount=-ENL_V_MAT_EXTRU_14_REACH, mode=Mode.PRIVATE) & part.part
    add(enl_v_mat_extru_14_tool1.solids().sort_by_distance((145.526622, 85.461058, 105.15))[0], mode=Mode.SUBTRACT)
    add(enl_v_mat_extru_14_tool2.solids().sort_by_distance((-47.526622, 85.461058, 105.15))[0], mode=Mode.SUBTRACT)


solid = part.part
